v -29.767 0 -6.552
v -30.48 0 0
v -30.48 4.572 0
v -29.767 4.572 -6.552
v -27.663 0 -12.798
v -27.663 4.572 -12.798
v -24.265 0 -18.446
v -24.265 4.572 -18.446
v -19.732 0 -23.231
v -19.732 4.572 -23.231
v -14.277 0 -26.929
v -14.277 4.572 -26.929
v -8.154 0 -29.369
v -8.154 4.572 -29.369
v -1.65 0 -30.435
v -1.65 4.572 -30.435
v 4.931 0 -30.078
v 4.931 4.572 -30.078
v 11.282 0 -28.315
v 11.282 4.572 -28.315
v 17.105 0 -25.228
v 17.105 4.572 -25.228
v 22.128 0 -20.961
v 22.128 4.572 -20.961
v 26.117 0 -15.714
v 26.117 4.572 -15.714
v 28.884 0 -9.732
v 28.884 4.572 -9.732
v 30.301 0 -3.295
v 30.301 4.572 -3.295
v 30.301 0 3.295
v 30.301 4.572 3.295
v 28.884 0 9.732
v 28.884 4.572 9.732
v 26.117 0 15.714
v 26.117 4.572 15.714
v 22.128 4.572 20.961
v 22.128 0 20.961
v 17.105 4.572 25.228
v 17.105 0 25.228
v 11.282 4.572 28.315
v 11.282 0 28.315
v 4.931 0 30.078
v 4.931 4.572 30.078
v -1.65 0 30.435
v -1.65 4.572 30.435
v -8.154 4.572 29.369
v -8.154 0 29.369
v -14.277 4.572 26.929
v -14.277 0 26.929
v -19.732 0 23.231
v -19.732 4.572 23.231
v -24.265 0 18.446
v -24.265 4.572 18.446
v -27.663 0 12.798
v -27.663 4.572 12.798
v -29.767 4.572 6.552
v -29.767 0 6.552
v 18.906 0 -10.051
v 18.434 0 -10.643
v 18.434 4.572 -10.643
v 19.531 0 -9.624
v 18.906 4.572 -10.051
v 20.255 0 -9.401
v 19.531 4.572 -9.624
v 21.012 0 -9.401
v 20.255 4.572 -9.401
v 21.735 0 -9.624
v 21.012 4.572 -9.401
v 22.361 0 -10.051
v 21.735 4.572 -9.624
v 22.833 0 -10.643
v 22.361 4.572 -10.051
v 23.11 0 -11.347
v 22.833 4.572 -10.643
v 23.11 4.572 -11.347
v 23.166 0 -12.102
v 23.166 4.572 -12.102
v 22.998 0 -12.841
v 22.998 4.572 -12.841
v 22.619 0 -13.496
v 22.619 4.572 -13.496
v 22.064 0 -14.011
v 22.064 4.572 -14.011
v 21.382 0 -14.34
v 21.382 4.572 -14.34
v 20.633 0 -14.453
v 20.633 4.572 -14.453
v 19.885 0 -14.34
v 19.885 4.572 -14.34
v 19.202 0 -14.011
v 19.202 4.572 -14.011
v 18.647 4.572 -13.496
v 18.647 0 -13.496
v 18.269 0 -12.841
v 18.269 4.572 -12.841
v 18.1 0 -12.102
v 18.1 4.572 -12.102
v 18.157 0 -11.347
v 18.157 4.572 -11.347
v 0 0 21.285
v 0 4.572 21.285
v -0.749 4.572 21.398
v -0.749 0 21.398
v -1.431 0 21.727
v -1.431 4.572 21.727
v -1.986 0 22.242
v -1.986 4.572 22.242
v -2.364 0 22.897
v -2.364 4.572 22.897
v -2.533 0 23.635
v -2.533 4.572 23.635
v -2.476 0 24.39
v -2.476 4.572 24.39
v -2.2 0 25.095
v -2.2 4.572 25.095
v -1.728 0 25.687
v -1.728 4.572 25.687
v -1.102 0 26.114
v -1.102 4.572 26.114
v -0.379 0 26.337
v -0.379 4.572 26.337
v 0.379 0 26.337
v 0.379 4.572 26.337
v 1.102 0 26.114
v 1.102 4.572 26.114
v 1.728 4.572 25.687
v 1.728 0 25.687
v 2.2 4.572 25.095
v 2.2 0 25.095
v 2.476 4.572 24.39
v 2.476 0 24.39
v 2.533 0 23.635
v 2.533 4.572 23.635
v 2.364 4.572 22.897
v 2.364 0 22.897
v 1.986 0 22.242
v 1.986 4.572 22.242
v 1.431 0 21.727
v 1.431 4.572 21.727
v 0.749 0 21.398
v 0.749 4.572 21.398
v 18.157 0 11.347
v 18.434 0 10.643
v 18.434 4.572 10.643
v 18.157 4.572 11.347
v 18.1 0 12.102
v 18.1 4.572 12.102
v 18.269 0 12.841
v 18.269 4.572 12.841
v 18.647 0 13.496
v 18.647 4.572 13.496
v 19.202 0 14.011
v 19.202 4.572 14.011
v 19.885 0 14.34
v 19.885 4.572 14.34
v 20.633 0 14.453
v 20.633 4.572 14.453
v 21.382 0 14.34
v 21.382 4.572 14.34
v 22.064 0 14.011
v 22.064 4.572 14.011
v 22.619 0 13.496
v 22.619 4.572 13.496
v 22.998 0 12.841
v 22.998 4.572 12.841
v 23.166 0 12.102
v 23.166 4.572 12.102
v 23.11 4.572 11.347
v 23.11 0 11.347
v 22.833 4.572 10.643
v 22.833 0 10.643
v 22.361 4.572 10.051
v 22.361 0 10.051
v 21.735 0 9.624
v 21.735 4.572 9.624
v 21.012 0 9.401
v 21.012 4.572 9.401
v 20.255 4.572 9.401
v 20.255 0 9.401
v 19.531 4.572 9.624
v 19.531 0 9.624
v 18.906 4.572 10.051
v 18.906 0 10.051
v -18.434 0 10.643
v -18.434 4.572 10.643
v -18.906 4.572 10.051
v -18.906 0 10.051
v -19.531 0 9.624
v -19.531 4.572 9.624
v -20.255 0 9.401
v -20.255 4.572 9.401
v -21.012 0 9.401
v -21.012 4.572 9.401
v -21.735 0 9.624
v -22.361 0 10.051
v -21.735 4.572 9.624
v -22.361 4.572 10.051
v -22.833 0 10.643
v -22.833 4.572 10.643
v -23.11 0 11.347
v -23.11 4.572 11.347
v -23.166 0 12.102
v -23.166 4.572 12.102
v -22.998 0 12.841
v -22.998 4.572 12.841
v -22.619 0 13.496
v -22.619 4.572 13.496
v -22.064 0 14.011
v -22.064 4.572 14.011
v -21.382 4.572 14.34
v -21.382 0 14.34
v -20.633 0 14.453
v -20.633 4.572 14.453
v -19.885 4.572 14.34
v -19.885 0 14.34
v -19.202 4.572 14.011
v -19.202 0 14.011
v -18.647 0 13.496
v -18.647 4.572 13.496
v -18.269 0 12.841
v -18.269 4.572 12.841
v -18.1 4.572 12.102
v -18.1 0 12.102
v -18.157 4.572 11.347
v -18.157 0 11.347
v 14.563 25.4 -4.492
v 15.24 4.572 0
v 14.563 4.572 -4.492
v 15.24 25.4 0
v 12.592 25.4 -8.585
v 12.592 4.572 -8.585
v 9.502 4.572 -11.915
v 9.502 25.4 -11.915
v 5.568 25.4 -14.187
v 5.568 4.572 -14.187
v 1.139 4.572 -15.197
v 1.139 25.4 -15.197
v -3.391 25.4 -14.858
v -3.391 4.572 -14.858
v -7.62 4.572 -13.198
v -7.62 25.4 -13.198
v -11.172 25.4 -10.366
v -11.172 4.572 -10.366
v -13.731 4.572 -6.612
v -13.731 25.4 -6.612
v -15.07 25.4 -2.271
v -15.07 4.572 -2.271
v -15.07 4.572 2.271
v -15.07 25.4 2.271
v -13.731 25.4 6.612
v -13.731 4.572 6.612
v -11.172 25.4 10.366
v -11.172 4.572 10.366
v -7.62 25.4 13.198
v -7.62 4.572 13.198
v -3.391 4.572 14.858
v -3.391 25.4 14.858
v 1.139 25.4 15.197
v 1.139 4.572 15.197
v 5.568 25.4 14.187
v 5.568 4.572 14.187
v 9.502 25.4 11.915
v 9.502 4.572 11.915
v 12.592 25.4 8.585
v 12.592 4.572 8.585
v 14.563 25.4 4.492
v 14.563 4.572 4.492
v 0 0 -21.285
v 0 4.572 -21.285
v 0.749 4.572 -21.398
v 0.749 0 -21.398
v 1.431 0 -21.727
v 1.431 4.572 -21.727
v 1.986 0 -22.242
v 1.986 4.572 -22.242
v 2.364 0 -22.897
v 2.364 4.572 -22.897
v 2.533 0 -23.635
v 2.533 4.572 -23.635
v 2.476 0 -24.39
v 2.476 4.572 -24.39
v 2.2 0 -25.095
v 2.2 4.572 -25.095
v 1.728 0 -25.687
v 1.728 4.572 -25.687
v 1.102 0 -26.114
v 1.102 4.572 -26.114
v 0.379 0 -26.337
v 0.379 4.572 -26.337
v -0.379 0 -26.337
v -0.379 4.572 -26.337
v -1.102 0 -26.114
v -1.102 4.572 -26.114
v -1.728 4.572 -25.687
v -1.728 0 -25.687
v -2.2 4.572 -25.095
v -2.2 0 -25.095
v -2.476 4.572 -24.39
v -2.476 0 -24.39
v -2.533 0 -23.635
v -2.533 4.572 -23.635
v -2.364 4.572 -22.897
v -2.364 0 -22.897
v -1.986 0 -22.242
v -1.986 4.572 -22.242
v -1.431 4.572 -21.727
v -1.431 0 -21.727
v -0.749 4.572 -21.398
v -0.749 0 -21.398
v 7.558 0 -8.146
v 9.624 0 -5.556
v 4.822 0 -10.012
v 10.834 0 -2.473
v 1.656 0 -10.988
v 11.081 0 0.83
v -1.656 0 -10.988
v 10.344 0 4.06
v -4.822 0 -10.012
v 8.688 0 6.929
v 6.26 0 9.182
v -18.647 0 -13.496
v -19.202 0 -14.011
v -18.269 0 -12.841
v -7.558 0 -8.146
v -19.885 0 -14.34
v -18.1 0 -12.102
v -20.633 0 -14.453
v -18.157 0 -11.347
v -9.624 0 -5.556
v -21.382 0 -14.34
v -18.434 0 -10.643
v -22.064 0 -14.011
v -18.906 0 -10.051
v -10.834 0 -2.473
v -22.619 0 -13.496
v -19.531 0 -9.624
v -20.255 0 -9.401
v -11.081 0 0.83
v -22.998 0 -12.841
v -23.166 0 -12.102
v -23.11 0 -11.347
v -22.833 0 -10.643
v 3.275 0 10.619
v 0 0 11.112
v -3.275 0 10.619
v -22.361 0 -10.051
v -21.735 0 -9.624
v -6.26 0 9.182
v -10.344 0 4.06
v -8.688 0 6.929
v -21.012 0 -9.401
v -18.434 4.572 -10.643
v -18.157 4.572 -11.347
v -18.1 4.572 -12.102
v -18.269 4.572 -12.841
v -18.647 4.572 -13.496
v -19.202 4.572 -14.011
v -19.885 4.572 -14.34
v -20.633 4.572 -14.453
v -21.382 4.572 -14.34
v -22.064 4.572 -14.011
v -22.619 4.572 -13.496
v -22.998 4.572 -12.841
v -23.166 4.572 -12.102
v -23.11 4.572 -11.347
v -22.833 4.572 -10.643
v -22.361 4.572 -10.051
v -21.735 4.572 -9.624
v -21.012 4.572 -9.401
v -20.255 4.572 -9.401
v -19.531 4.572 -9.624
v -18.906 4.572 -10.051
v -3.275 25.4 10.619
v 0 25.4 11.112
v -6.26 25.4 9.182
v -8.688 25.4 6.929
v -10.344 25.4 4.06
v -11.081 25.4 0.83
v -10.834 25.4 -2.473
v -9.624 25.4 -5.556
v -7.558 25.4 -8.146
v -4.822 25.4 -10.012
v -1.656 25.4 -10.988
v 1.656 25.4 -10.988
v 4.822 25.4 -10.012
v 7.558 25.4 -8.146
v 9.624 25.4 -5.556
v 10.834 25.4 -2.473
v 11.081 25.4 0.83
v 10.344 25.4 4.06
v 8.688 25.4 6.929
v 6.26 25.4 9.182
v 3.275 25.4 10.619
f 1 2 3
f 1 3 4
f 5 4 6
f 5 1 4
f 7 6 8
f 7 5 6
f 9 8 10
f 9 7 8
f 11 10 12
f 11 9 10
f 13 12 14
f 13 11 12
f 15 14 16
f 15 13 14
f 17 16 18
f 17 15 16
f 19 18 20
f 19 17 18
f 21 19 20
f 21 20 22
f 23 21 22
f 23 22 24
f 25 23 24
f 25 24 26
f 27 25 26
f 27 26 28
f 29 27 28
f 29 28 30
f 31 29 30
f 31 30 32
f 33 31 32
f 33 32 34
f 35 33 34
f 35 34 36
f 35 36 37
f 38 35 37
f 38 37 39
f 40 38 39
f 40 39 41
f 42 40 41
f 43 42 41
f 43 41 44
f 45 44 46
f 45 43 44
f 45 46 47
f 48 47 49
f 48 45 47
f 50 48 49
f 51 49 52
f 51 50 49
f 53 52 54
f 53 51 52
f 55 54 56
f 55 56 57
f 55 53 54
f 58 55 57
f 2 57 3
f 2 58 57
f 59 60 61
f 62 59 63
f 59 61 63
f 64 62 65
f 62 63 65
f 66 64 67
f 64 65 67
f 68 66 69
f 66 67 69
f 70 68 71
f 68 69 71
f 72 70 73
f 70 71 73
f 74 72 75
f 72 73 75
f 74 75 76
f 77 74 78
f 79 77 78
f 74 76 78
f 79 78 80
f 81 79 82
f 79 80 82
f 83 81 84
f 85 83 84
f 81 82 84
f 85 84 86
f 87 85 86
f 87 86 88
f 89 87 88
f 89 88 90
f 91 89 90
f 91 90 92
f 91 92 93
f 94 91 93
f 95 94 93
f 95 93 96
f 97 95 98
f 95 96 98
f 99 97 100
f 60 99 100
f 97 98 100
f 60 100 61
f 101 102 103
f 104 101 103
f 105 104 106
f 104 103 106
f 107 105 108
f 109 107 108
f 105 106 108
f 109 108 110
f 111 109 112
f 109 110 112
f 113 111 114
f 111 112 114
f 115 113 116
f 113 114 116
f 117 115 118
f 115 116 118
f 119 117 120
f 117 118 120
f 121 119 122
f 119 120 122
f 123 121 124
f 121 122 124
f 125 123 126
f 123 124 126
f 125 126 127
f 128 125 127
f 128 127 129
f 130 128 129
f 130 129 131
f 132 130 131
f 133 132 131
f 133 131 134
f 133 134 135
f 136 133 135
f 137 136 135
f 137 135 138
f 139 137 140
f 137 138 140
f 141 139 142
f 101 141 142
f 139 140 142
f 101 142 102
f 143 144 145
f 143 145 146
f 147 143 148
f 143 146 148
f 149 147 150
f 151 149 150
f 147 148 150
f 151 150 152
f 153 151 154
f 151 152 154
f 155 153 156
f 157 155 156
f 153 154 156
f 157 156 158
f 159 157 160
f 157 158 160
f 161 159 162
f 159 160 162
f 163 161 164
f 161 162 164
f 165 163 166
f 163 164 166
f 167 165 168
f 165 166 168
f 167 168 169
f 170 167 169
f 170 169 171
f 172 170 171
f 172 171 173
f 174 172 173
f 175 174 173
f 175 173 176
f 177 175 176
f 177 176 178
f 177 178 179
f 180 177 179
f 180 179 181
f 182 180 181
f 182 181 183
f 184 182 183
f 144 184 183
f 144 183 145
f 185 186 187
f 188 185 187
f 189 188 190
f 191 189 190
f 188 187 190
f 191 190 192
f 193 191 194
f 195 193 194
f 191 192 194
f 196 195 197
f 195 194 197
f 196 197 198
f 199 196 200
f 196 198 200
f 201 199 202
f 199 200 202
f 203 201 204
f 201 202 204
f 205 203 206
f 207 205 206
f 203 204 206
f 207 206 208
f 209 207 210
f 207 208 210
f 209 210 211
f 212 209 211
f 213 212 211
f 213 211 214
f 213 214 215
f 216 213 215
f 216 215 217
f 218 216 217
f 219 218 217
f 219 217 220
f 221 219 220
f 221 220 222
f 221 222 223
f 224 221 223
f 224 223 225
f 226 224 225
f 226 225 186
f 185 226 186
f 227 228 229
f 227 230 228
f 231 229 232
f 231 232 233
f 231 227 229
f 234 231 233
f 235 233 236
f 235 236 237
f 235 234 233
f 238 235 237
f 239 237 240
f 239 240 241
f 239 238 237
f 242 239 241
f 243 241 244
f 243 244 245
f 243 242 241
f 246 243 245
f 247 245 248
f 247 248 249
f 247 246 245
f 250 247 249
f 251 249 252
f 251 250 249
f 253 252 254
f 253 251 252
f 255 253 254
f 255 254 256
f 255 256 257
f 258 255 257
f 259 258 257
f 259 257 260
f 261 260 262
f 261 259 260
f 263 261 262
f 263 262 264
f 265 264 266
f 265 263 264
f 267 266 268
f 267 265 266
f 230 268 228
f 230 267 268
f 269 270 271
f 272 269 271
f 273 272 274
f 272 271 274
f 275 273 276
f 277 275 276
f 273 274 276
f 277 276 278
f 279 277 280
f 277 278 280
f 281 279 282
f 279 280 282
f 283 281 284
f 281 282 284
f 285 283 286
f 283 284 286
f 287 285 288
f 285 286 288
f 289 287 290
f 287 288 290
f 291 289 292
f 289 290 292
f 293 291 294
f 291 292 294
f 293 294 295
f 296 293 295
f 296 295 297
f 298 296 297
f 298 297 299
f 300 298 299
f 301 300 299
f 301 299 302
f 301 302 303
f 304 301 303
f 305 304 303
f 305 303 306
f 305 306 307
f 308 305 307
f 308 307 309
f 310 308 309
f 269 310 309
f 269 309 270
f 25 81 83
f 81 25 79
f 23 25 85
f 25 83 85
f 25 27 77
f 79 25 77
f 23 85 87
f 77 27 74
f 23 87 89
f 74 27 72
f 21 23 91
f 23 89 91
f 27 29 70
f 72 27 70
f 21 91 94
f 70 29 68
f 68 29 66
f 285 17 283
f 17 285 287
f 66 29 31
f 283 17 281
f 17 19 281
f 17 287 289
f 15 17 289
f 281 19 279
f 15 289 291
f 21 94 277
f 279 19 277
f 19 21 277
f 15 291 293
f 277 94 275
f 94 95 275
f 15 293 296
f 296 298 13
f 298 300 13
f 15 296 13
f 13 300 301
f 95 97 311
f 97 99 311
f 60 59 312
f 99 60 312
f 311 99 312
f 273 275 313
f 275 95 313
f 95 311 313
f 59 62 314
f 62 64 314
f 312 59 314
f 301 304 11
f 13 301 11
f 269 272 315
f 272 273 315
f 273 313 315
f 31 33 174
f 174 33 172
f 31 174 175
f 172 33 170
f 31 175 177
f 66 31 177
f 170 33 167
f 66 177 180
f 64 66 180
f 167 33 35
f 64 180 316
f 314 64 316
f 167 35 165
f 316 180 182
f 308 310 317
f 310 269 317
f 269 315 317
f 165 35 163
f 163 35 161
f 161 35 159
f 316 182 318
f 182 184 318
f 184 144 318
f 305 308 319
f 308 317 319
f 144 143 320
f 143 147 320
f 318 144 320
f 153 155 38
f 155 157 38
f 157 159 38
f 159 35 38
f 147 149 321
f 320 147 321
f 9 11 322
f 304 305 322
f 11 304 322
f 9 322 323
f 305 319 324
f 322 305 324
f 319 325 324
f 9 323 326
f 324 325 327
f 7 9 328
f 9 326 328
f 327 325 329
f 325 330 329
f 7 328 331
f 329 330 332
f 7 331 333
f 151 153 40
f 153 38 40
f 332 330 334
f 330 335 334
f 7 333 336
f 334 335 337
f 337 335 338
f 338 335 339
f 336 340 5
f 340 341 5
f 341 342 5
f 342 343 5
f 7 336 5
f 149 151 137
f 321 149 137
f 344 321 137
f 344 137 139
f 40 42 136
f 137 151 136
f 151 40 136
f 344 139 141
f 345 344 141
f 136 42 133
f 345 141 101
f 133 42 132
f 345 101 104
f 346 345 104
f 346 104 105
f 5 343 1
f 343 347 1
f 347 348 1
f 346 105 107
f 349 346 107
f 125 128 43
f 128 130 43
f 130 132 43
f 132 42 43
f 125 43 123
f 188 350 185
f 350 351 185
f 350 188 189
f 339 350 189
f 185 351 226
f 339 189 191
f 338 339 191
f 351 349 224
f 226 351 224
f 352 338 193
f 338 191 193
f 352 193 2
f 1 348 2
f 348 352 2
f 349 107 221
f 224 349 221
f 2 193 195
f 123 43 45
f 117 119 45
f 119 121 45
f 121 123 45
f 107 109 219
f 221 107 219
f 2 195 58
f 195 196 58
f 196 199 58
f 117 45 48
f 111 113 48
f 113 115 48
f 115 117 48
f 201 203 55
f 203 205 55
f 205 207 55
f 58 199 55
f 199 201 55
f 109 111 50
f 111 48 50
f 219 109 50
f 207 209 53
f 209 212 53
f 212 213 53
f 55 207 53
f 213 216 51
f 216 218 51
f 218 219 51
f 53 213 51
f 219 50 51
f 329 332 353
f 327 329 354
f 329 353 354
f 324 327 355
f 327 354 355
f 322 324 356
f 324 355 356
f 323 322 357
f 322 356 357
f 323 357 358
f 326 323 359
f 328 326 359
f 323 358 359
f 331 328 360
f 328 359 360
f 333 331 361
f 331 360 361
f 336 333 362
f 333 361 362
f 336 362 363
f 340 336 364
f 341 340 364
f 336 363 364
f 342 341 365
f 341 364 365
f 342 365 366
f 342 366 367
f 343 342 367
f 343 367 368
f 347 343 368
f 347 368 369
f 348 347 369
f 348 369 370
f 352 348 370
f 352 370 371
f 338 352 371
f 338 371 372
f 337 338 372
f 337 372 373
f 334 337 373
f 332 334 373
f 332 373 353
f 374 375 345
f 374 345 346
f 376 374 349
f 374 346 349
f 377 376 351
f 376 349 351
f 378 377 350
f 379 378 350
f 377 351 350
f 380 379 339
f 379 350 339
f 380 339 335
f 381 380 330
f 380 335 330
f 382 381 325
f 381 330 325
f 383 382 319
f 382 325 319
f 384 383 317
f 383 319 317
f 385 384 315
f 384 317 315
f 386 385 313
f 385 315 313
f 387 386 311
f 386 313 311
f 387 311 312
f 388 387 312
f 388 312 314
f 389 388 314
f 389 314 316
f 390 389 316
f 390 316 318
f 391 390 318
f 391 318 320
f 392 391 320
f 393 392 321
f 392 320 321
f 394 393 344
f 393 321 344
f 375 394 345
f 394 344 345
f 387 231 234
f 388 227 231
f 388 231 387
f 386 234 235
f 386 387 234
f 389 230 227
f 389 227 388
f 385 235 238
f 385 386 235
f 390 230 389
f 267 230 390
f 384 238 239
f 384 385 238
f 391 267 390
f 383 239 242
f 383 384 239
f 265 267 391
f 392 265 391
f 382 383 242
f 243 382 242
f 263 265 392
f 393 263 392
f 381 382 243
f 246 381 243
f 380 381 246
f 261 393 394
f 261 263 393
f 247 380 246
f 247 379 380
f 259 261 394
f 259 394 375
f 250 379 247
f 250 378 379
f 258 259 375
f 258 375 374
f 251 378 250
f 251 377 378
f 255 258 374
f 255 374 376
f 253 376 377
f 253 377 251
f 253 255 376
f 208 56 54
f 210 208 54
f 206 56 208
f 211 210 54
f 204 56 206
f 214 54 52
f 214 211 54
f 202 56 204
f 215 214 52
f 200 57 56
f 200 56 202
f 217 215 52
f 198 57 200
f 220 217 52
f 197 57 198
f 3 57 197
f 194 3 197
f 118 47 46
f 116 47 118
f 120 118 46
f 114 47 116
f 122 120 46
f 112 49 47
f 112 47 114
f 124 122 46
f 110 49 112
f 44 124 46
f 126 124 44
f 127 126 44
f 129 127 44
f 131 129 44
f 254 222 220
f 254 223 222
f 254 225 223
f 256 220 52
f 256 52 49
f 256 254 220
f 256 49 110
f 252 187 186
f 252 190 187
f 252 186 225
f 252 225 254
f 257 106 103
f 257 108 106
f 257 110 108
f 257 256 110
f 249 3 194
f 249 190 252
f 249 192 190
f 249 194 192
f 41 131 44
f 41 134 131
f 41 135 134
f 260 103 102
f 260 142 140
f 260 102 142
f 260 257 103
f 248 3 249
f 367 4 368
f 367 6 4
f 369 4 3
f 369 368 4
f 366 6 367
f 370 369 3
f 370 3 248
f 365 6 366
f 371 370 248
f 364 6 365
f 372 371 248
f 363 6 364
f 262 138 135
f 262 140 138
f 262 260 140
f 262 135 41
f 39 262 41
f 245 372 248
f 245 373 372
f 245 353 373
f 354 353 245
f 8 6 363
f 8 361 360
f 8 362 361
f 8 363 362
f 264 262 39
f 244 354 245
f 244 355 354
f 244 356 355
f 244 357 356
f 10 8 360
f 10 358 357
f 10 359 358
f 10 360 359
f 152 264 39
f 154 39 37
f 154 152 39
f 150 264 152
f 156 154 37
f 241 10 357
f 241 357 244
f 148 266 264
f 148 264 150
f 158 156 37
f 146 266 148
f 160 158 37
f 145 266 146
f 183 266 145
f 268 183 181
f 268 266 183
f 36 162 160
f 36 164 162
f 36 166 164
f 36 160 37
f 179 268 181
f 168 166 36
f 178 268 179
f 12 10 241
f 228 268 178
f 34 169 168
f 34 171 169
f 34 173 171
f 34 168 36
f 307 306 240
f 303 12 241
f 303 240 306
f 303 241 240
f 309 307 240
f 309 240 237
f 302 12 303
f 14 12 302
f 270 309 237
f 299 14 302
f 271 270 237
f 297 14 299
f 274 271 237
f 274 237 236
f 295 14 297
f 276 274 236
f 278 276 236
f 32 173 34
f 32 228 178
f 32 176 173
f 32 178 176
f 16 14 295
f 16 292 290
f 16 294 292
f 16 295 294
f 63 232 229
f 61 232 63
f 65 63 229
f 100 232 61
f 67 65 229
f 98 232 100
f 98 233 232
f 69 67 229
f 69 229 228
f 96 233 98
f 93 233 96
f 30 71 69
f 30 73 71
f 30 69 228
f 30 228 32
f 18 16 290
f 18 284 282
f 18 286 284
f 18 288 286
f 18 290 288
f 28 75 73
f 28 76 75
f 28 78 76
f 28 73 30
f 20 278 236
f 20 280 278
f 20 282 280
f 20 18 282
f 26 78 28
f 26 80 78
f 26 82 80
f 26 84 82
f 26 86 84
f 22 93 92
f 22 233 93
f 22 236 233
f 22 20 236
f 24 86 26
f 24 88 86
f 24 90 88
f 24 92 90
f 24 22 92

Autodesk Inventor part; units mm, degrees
sketch "Sketch1" plane through (0, 0, 0) normal (0, 1, 0) x (-1, 0, 0)
  circle A0 centre (0, 0) radius 30.48
  dimension "d0" = 60.96
extrude "Extrusion1" add sketch "Sketch1" along normal blind 25.4
sketch "Sketch2" plane through (0, 25.4, 0) normal (0, 1, 0) x (1, 0, 0)
  circle A0 centre (0, 0) radius 30.48 projected
  circle A1 centre (0, 0) radius 15.24
  dimension "d3" = 30.48
extrude "Extrusion2" cut sketch "Sketch2" against normal blind 20.828
hole "Hole1" at (0, 25.4, 0) direction (0, -1, 0) diameter 22.225 end through all
ref_plane "Work Plane1" through (0, 0, 23.8252) normal (0, 0, 1) x (1, 0, 0)
hole "Hole2" at (0, 0, 23.8252) direction (0, 1, 0) diameter 5.08 end through all
pattern_circular "Circular Pattern1" count 6 over 360 about axis through (0, 25.4, 0) along (0, -1, 0) of "Hole2"
properties part number ".875 Bearing Hub"
